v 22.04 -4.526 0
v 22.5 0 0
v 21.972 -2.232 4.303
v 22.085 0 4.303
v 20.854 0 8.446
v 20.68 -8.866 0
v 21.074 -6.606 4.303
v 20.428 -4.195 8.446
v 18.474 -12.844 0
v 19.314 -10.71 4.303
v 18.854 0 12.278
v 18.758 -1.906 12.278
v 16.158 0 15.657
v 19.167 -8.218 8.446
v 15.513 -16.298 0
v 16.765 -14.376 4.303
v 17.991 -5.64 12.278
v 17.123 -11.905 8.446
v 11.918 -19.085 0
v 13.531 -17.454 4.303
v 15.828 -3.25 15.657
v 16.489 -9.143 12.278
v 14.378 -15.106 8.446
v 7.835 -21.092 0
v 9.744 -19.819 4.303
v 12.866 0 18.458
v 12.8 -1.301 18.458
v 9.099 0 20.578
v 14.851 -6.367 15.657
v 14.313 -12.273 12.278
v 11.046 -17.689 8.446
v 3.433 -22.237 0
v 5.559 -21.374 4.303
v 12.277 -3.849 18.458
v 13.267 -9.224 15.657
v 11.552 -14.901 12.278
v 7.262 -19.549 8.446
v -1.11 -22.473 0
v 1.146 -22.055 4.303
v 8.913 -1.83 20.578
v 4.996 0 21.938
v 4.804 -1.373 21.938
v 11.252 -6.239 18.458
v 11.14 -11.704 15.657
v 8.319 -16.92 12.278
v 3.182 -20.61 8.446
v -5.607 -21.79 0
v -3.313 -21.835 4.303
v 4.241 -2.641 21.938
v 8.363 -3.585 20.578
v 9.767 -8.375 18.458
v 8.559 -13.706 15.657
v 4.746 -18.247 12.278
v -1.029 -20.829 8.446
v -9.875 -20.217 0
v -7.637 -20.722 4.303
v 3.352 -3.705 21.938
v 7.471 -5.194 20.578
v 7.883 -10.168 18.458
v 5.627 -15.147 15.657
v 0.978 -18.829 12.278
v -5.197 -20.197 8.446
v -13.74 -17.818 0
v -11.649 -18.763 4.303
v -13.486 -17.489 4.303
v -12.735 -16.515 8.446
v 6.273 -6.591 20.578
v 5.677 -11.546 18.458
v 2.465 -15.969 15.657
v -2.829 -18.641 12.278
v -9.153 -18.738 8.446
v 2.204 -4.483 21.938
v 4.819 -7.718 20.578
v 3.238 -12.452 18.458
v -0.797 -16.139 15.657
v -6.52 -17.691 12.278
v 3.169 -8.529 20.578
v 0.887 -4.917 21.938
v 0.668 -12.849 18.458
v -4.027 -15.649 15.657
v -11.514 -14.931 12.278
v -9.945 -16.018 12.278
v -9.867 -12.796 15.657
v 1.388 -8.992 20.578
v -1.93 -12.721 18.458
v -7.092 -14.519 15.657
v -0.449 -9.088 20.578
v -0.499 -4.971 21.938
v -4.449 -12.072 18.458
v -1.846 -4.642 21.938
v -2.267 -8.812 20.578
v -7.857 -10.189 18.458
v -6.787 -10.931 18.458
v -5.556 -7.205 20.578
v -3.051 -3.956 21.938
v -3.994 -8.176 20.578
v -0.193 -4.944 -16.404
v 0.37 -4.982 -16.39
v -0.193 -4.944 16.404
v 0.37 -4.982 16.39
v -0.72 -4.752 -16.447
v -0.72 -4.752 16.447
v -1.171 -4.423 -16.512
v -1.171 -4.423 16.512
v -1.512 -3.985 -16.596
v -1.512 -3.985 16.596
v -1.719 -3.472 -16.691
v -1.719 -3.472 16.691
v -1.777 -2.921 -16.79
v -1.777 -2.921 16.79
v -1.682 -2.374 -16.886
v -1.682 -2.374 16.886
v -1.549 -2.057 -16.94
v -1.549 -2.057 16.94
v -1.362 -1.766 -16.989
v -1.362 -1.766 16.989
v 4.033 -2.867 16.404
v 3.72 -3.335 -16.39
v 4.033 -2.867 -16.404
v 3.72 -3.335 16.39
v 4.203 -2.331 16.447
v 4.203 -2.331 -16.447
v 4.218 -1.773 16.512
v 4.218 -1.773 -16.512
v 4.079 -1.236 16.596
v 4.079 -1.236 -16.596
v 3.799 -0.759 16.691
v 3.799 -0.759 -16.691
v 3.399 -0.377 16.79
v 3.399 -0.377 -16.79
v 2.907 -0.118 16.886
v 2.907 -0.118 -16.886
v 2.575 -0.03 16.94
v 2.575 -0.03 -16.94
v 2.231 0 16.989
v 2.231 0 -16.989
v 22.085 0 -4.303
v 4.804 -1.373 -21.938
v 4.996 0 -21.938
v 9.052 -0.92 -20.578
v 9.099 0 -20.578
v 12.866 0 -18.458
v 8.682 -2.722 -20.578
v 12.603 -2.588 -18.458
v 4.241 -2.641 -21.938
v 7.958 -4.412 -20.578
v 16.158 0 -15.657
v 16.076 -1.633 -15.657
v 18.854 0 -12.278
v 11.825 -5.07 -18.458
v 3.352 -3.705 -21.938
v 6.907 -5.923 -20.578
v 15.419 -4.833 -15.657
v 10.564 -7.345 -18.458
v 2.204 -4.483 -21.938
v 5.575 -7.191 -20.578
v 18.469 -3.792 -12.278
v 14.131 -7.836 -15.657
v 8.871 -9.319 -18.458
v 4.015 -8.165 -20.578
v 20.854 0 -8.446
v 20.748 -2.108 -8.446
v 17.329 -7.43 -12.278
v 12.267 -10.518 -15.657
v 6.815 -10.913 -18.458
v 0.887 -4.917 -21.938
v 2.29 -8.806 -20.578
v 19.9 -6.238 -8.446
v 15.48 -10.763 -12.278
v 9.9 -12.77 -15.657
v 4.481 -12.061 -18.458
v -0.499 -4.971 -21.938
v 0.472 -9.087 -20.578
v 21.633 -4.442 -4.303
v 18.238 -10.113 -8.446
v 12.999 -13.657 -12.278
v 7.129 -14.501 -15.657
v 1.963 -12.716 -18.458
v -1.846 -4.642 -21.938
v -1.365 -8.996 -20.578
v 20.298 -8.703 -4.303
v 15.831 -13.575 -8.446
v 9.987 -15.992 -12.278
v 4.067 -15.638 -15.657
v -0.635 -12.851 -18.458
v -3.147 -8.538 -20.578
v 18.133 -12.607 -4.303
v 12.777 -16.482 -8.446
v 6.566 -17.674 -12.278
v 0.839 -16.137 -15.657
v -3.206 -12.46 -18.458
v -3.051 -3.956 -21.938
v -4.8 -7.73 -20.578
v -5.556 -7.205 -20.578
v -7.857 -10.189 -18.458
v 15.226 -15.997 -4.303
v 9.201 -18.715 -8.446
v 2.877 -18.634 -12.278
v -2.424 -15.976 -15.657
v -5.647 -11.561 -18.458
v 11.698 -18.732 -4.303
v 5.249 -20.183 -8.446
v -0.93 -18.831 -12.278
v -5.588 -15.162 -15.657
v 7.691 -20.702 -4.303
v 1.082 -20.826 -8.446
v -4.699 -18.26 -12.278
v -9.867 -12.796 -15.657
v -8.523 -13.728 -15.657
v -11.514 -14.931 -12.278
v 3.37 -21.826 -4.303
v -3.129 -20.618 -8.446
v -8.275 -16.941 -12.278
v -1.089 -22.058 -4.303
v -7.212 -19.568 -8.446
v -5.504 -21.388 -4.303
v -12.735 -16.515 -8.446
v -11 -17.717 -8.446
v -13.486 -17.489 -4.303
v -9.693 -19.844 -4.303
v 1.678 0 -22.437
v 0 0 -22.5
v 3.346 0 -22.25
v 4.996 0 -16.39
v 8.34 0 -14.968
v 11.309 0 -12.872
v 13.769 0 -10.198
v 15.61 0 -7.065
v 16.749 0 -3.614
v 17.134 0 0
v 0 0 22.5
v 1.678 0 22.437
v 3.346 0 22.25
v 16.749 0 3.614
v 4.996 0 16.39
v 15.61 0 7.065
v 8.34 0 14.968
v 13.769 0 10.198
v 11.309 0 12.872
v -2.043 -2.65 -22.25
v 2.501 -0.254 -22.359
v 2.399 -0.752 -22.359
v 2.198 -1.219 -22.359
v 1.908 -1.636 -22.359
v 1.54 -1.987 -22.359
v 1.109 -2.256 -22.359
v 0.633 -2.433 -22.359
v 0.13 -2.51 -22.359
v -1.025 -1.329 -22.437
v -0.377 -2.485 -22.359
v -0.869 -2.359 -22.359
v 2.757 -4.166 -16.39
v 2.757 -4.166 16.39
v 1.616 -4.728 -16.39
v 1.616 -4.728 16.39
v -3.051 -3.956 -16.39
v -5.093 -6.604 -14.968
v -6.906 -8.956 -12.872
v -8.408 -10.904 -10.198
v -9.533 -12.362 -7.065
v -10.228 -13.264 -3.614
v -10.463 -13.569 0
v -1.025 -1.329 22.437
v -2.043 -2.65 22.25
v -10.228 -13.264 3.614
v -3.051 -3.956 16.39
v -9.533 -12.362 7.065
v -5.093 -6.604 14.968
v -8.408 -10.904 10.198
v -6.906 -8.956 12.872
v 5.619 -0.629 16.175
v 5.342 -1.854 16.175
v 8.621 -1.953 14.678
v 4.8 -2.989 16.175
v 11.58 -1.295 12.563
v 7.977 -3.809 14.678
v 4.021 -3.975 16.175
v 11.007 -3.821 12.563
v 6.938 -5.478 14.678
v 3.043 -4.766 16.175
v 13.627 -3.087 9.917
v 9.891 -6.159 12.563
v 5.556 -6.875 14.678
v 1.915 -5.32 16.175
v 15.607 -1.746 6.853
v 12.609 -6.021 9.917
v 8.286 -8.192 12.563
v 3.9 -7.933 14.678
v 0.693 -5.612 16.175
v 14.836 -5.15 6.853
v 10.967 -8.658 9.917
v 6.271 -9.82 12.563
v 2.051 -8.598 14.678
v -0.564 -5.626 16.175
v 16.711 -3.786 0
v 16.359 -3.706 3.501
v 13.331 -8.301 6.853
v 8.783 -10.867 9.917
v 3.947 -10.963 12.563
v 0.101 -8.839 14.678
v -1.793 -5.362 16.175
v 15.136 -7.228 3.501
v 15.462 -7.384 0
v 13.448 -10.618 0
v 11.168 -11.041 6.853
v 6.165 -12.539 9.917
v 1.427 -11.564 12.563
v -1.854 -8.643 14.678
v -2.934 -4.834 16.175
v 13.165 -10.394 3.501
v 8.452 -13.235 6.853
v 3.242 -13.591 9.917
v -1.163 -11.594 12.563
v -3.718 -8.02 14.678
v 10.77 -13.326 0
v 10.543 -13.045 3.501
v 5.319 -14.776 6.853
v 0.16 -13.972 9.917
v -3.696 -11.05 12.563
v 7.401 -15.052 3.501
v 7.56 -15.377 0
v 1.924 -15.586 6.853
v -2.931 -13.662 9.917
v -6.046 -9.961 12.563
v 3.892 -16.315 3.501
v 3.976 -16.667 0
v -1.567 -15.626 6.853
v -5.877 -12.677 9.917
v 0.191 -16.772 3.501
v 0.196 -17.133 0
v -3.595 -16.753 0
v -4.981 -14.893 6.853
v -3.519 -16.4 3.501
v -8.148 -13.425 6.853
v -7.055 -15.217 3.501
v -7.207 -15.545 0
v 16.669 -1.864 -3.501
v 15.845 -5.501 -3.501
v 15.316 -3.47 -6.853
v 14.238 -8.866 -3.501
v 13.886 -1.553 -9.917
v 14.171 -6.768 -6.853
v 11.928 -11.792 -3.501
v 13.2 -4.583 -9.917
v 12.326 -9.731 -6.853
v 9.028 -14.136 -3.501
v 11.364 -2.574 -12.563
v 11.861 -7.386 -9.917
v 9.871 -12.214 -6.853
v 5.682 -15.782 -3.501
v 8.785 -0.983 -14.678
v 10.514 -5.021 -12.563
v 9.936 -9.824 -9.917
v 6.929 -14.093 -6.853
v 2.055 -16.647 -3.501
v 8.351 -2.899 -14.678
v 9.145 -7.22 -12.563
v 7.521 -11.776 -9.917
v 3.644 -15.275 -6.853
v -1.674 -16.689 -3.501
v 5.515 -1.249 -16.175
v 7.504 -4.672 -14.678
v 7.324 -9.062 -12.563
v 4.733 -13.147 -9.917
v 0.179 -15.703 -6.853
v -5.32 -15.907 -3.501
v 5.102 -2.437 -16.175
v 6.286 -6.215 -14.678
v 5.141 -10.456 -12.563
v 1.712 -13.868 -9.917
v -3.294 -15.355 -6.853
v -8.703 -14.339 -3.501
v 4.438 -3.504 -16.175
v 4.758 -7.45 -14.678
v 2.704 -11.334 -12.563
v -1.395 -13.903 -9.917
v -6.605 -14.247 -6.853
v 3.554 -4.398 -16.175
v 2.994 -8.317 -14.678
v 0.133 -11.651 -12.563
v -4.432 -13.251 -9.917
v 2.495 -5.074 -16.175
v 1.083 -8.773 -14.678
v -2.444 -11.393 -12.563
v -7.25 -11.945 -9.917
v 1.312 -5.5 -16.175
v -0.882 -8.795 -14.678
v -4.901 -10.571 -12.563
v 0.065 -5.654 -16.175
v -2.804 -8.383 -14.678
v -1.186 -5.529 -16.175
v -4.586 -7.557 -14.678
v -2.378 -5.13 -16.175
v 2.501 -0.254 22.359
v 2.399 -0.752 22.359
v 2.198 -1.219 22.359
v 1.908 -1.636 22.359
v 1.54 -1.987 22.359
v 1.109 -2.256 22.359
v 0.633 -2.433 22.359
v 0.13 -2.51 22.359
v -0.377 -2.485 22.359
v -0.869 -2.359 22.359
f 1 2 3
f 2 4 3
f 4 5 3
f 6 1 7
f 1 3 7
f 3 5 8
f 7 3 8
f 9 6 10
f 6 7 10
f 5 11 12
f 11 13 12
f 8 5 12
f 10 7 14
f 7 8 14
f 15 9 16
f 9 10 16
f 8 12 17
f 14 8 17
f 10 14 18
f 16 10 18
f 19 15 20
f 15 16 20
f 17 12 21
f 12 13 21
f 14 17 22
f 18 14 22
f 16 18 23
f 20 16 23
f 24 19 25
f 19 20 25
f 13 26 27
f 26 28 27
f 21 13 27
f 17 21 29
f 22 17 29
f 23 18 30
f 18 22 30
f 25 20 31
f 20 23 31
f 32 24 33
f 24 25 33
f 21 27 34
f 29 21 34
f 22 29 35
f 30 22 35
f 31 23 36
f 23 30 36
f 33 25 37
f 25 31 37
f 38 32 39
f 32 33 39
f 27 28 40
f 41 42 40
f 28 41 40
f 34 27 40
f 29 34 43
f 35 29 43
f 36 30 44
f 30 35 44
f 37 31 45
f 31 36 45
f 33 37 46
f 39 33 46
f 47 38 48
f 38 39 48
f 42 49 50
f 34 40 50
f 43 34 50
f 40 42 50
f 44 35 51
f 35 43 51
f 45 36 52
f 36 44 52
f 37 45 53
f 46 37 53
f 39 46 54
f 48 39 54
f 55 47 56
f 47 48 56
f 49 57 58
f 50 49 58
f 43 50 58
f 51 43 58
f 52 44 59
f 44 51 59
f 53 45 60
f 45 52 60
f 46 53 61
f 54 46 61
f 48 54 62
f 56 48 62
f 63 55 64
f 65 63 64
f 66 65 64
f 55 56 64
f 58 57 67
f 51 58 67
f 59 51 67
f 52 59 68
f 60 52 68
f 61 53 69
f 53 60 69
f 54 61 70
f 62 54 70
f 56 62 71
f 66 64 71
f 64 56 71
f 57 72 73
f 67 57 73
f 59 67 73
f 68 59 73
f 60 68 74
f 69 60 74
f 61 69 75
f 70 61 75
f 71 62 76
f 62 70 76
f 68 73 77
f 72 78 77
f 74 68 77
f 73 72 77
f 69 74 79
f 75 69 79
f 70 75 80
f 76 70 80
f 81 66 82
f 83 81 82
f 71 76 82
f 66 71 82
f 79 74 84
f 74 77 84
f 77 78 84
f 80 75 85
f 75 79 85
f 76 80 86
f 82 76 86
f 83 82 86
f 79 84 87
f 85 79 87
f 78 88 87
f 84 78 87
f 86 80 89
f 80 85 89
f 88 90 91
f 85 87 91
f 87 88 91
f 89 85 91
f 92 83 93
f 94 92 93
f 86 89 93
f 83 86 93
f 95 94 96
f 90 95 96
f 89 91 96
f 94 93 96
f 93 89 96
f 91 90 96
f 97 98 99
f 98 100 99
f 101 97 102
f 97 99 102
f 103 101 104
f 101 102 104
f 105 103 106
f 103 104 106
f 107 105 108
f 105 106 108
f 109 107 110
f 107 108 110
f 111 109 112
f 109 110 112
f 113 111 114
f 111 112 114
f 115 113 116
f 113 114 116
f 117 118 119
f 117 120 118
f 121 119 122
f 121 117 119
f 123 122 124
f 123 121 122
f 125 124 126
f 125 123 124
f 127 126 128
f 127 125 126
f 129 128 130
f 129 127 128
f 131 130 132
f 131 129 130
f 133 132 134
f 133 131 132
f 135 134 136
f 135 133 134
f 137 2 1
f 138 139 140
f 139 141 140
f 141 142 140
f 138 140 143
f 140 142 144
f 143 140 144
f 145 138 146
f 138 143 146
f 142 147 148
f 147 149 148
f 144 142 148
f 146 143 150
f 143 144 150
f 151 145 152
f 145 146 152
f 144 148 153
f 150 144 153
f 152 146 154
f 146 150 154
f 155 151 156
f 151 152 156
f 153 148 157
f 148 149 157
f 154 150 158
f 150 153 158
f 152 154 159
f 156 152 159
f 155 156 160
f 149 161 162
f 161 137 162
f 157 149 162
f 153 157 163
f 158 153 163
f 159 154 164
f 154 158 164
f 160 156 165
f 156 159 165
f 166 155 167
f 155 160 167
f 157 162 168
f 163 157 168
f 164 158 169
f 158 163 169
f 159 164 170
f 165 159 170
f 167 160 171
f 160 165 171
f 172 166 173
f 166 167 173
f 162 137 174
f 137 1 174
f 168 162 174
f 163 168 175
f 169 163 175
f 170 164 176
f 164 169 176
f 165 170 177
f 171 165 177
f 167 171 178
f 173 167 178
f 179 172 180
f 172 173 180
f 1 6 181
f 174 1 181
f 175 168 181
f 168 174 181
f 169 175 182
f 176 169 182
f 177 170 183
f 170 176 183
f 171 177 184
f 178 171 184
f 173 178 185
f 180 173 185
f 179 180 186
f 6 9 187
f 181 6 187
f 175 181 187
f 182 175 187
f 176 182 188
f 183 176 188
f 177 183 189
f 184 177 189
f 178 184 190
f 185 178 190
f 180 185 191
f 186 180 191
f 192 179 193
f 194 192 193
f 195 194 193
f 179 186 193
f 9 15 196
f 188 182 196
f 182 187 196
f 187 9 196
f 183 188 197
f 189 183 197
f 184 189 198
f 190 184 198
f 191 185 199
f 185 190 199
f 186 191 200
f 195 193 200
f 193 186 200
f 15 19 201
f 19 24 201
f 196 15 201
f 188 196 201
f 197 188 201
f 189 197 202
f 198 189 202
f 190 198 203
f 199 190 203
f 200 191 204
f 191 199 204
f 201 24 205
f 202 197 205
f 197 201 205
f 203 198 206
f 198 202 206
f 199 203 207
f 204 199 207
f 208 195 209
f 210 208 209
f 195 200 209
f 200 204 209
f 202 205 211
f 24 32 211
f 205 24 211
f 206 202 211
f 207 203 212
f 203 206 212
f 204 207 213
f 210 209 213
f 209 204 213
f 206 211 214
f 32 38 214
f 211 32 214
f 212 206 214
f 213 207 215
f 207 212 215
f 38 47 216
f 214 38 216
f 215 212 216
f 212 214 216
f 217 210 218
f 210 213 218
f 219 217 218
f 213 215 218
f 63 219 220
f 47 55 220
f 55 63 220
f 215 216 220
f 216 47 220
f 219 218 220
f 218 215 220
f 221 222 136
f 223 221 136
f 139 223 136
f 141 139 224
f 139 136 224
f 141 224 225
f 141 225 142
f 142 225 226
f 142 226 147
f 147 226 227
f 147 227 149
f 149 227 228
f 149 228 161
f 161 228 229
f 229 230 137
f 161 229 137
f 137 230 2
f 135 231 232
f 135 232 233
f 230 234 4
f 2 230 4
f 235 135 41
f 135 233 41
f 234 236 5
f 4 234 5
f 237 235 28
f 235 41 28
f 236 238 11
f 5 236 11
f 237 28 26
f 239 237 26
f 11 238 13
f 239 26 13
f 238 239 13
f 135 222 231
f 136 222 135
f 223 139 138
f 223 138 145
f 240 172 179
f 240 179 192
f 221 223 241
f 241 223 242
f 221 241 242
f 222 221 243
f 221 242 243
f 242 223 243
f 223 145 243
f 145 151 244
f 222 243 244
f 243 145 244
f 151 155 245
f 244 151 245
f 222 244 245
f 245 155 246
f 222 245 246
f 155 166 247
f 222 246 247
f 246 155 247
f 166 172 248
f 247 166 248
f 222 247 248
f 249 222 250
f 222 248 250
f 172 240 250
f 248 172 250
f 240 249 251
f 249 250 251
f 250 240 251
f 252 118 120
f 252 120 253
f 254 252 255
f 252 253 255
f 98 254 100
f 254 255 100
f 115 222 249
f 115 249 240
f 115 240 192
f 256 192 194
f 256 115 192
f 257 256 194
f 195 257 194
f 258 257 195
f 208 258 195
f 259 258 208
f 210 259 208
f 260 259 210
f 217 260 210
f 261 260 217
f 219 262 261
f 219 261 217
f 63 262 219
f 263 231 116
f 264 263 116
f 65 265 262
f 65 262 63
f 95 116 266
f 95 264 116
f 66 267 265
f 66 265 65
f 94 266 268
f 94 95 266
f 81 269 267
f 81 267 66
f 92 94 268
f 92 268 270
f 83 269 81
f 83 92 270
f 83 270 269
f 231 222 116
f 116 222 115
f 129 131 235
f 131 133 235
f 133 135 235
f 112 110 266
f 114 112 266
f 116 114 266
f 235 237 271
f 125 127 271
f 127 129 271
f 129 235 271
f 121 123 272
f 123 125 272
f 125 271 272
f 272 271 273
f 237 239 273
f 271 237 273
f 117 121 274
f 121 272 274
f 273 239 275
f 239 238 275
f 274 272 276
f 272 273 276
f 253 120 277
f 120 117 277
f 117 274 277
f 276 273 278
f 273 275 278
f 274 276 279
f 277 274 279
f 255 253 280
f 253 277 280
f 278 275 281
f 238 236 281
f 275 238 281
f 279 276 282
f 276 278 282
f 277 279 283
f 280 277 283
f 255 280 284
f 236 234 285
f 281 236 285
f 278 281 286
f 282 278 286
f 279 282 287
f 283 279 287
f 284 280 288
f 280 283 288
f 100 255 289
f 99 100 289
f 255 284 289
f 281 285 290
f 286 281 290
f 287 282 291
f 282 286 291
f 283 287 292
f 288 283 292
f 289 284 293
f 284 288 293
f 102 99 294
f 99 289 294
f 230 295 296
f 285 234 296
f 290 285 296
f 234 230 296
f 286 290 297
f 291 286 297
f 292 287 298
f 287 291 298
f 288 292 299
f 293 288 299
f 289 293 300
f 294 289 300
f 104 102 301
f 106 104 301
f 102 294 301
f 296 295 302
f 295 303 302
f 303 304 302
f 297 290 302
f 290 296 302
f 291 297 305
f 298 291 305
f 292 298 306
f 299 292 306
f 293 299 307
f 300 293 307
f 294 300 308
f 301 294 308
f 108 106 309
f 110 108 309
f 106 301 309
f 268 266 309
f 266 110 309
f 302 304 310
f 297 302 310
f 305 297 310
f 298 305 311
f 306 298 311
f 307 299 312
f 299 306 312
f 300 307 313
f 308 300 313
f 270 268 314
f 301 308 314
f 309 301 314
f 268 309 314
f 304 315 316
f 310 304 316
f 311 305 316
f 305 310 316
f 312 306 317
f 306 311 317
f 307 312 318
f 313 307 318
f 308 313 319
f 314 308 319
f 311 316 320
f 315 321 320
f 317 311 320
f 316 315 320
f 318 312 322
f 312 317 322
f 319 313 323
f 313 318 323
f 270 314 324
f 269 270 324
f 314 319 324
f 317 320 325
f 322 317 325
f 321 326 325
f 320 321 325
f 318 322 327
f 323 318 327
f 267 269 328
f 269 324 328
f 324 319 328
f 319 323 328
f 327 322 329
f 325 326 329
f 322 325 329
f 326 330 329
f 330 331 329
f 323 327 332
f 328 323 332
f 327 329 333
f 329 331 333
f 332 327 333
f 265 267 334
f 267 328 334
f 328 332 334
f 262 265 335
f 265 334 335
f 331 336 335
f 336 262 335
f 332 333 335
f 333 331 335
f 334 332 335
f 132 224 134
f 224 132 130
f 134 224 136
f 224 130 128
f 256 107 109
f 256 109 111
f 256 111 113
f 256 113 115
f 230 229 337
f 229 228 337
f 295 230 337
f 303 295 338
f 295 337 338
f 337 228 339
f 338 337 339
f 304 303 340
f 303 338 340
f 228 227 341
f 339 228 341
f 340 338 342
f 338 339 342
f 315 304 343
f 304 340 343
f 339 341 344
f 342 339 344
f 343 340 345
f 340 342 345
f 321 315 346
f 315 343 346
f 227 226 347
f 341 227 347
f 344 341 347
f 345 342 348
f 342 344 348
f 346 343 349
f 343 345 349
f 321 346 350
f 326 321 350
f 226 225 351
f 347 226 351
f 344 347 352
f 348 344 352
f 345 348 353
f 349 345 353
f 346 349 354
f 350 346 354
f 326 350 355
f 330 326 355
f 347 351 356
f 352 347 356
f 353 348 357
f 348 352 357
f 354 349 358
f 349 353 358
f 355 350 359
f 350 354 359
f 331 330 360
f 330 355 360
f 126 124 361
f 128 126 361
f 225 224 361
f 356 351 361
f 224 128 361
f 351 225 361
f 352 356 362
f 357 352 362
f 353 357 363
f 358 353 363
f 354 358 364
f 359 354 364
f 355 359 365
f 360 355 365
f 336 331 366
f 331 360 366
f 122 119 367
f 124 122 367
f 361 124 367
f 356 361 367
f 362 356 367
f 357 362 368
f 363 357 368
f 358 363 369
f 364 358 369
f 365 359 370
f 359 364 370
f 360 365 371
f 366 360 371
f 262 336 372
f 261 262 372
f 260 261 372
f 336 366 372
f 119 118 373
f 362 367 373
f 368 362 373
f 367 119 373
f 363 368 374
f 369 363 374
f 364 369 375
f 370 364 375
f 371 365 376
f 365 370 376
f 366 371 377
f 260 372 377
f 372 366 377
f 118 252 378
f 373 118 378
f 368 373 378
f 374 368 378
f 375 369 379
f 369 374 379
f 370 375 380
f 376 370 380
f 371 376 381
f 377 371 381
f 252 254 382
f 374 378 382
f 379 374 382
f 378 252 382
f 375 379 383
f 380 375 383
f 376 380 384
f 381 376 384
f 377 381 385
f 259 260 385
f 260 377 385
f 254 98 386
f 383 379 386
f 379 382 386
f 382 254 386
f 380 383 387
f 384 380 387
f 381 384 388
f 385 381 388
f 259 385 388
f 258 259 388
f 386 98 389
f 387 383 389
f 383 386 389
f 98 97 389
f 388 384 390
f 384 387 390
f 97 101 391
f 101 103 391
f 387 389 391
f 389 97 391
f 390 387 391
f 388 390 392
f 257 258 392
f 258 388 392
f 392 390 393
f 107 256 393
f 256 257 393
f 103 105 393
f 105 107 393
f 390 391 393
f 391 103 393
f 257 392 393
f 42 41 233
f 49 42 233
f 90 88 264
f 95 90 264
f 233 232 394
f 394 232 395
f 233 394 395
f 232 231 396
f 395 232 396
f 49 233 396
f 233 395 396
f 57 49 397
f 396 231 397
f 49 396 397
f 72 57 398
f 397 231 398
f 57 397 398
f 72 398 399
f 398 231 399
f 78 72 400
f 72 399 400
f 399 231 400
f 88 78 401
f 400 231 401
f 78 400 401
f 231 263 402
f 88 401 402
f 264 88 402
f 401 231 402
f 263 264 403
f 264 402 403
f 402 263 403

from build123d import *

# Parameters (mm, degrees)
F1_ANGLE = 127.6370568736
F2_R     = 2


with BuildPart() as f1:
    # F0 (on Front) → F1 (revolve)
    with BuildSketch(Plane.XZ):
        with BuildLine():
            ThreePointArc((4.9959747121, 21.9383280283), (2.5137242653, 22.3591410908), (0, 22.5))
            Line((0, 22.5), (0, 17.1344819252))
            ThreePointArc((0, 17.1344819252), (2.525573198, 16.9473287236), (4.9959747121, 16.3899575204))
            Line((4.9959747121, 16.3899575204), (4.9959747121, 21.9383280283))
        make_face()
        with BuildLine():
            ThreePointArc((4.9959747121, 16.3899575204), (2.525573198, 16.9473287236), (0, 17.1344819252))
            Line((0, 17.1344819252), (0, -17.1344819252))
            ThreePointArc((0, -17.1344819252), (2.525573198, -16.9473287236), (4.9959747121, -16.3899575204))
            Line((4.9959747121, -16.3899575204), (4.9959747121, 16.3899575204))
        make_face()
        with BuildLine():
            Line((0, -17.1344819252), (0, -22.5))
            ThreePointArc((0, -22.5), (2.5137242653, -22.3591410908), (4.9959747121, -21.9383280283))
            Line((4.9959747121, -21.9383280283), (4.9959747121, -16.3899575204))
            ThreePointArc((4.9959747121, -16.3899575204), (2.525573198, -16.9473287236), (0, -17.1344819252))
        make_face()
        with BuildLine():
            ThreePointArc((22.5, 0), (17.5877717608, 14.0328288128), (4.9959747121, 21.9383280283))
            Line((4.9959747121, 21.9383280283), (4.9959747121, 16.3899575204))
            ThreePointArc((4.9959747121, 16.3899575204), (13.7694209981, 10.1977211288), (17.1344819252, 0))
            ThreePointArc((17.1344819252, 0), (13.7694209981, -10.1977211288), (4.9959747121, -16.3899575204))
            Line((4.9959747121, -16.3899575204), (4.9959747121, -21.9383280283))
            ThreePointArc((4.9959747121, -21.9383280283), (17.5877717608, -14.0328288128), (22.5, 0))
        make_face()
    revolve(axis=Axis((0, 0, 0), (0, 0, -1)), revolution_arc=F1_ANGLE)

    # F2
    f2_edges = [f1.edges().sort_by_distance(p)[0] for p in [
        (-3.050829, -3.956287, 0),
        (4.995975, 0, 0),
    ]]
    fillet(f2_edges, radius=F2_R)


solid = f1.part
